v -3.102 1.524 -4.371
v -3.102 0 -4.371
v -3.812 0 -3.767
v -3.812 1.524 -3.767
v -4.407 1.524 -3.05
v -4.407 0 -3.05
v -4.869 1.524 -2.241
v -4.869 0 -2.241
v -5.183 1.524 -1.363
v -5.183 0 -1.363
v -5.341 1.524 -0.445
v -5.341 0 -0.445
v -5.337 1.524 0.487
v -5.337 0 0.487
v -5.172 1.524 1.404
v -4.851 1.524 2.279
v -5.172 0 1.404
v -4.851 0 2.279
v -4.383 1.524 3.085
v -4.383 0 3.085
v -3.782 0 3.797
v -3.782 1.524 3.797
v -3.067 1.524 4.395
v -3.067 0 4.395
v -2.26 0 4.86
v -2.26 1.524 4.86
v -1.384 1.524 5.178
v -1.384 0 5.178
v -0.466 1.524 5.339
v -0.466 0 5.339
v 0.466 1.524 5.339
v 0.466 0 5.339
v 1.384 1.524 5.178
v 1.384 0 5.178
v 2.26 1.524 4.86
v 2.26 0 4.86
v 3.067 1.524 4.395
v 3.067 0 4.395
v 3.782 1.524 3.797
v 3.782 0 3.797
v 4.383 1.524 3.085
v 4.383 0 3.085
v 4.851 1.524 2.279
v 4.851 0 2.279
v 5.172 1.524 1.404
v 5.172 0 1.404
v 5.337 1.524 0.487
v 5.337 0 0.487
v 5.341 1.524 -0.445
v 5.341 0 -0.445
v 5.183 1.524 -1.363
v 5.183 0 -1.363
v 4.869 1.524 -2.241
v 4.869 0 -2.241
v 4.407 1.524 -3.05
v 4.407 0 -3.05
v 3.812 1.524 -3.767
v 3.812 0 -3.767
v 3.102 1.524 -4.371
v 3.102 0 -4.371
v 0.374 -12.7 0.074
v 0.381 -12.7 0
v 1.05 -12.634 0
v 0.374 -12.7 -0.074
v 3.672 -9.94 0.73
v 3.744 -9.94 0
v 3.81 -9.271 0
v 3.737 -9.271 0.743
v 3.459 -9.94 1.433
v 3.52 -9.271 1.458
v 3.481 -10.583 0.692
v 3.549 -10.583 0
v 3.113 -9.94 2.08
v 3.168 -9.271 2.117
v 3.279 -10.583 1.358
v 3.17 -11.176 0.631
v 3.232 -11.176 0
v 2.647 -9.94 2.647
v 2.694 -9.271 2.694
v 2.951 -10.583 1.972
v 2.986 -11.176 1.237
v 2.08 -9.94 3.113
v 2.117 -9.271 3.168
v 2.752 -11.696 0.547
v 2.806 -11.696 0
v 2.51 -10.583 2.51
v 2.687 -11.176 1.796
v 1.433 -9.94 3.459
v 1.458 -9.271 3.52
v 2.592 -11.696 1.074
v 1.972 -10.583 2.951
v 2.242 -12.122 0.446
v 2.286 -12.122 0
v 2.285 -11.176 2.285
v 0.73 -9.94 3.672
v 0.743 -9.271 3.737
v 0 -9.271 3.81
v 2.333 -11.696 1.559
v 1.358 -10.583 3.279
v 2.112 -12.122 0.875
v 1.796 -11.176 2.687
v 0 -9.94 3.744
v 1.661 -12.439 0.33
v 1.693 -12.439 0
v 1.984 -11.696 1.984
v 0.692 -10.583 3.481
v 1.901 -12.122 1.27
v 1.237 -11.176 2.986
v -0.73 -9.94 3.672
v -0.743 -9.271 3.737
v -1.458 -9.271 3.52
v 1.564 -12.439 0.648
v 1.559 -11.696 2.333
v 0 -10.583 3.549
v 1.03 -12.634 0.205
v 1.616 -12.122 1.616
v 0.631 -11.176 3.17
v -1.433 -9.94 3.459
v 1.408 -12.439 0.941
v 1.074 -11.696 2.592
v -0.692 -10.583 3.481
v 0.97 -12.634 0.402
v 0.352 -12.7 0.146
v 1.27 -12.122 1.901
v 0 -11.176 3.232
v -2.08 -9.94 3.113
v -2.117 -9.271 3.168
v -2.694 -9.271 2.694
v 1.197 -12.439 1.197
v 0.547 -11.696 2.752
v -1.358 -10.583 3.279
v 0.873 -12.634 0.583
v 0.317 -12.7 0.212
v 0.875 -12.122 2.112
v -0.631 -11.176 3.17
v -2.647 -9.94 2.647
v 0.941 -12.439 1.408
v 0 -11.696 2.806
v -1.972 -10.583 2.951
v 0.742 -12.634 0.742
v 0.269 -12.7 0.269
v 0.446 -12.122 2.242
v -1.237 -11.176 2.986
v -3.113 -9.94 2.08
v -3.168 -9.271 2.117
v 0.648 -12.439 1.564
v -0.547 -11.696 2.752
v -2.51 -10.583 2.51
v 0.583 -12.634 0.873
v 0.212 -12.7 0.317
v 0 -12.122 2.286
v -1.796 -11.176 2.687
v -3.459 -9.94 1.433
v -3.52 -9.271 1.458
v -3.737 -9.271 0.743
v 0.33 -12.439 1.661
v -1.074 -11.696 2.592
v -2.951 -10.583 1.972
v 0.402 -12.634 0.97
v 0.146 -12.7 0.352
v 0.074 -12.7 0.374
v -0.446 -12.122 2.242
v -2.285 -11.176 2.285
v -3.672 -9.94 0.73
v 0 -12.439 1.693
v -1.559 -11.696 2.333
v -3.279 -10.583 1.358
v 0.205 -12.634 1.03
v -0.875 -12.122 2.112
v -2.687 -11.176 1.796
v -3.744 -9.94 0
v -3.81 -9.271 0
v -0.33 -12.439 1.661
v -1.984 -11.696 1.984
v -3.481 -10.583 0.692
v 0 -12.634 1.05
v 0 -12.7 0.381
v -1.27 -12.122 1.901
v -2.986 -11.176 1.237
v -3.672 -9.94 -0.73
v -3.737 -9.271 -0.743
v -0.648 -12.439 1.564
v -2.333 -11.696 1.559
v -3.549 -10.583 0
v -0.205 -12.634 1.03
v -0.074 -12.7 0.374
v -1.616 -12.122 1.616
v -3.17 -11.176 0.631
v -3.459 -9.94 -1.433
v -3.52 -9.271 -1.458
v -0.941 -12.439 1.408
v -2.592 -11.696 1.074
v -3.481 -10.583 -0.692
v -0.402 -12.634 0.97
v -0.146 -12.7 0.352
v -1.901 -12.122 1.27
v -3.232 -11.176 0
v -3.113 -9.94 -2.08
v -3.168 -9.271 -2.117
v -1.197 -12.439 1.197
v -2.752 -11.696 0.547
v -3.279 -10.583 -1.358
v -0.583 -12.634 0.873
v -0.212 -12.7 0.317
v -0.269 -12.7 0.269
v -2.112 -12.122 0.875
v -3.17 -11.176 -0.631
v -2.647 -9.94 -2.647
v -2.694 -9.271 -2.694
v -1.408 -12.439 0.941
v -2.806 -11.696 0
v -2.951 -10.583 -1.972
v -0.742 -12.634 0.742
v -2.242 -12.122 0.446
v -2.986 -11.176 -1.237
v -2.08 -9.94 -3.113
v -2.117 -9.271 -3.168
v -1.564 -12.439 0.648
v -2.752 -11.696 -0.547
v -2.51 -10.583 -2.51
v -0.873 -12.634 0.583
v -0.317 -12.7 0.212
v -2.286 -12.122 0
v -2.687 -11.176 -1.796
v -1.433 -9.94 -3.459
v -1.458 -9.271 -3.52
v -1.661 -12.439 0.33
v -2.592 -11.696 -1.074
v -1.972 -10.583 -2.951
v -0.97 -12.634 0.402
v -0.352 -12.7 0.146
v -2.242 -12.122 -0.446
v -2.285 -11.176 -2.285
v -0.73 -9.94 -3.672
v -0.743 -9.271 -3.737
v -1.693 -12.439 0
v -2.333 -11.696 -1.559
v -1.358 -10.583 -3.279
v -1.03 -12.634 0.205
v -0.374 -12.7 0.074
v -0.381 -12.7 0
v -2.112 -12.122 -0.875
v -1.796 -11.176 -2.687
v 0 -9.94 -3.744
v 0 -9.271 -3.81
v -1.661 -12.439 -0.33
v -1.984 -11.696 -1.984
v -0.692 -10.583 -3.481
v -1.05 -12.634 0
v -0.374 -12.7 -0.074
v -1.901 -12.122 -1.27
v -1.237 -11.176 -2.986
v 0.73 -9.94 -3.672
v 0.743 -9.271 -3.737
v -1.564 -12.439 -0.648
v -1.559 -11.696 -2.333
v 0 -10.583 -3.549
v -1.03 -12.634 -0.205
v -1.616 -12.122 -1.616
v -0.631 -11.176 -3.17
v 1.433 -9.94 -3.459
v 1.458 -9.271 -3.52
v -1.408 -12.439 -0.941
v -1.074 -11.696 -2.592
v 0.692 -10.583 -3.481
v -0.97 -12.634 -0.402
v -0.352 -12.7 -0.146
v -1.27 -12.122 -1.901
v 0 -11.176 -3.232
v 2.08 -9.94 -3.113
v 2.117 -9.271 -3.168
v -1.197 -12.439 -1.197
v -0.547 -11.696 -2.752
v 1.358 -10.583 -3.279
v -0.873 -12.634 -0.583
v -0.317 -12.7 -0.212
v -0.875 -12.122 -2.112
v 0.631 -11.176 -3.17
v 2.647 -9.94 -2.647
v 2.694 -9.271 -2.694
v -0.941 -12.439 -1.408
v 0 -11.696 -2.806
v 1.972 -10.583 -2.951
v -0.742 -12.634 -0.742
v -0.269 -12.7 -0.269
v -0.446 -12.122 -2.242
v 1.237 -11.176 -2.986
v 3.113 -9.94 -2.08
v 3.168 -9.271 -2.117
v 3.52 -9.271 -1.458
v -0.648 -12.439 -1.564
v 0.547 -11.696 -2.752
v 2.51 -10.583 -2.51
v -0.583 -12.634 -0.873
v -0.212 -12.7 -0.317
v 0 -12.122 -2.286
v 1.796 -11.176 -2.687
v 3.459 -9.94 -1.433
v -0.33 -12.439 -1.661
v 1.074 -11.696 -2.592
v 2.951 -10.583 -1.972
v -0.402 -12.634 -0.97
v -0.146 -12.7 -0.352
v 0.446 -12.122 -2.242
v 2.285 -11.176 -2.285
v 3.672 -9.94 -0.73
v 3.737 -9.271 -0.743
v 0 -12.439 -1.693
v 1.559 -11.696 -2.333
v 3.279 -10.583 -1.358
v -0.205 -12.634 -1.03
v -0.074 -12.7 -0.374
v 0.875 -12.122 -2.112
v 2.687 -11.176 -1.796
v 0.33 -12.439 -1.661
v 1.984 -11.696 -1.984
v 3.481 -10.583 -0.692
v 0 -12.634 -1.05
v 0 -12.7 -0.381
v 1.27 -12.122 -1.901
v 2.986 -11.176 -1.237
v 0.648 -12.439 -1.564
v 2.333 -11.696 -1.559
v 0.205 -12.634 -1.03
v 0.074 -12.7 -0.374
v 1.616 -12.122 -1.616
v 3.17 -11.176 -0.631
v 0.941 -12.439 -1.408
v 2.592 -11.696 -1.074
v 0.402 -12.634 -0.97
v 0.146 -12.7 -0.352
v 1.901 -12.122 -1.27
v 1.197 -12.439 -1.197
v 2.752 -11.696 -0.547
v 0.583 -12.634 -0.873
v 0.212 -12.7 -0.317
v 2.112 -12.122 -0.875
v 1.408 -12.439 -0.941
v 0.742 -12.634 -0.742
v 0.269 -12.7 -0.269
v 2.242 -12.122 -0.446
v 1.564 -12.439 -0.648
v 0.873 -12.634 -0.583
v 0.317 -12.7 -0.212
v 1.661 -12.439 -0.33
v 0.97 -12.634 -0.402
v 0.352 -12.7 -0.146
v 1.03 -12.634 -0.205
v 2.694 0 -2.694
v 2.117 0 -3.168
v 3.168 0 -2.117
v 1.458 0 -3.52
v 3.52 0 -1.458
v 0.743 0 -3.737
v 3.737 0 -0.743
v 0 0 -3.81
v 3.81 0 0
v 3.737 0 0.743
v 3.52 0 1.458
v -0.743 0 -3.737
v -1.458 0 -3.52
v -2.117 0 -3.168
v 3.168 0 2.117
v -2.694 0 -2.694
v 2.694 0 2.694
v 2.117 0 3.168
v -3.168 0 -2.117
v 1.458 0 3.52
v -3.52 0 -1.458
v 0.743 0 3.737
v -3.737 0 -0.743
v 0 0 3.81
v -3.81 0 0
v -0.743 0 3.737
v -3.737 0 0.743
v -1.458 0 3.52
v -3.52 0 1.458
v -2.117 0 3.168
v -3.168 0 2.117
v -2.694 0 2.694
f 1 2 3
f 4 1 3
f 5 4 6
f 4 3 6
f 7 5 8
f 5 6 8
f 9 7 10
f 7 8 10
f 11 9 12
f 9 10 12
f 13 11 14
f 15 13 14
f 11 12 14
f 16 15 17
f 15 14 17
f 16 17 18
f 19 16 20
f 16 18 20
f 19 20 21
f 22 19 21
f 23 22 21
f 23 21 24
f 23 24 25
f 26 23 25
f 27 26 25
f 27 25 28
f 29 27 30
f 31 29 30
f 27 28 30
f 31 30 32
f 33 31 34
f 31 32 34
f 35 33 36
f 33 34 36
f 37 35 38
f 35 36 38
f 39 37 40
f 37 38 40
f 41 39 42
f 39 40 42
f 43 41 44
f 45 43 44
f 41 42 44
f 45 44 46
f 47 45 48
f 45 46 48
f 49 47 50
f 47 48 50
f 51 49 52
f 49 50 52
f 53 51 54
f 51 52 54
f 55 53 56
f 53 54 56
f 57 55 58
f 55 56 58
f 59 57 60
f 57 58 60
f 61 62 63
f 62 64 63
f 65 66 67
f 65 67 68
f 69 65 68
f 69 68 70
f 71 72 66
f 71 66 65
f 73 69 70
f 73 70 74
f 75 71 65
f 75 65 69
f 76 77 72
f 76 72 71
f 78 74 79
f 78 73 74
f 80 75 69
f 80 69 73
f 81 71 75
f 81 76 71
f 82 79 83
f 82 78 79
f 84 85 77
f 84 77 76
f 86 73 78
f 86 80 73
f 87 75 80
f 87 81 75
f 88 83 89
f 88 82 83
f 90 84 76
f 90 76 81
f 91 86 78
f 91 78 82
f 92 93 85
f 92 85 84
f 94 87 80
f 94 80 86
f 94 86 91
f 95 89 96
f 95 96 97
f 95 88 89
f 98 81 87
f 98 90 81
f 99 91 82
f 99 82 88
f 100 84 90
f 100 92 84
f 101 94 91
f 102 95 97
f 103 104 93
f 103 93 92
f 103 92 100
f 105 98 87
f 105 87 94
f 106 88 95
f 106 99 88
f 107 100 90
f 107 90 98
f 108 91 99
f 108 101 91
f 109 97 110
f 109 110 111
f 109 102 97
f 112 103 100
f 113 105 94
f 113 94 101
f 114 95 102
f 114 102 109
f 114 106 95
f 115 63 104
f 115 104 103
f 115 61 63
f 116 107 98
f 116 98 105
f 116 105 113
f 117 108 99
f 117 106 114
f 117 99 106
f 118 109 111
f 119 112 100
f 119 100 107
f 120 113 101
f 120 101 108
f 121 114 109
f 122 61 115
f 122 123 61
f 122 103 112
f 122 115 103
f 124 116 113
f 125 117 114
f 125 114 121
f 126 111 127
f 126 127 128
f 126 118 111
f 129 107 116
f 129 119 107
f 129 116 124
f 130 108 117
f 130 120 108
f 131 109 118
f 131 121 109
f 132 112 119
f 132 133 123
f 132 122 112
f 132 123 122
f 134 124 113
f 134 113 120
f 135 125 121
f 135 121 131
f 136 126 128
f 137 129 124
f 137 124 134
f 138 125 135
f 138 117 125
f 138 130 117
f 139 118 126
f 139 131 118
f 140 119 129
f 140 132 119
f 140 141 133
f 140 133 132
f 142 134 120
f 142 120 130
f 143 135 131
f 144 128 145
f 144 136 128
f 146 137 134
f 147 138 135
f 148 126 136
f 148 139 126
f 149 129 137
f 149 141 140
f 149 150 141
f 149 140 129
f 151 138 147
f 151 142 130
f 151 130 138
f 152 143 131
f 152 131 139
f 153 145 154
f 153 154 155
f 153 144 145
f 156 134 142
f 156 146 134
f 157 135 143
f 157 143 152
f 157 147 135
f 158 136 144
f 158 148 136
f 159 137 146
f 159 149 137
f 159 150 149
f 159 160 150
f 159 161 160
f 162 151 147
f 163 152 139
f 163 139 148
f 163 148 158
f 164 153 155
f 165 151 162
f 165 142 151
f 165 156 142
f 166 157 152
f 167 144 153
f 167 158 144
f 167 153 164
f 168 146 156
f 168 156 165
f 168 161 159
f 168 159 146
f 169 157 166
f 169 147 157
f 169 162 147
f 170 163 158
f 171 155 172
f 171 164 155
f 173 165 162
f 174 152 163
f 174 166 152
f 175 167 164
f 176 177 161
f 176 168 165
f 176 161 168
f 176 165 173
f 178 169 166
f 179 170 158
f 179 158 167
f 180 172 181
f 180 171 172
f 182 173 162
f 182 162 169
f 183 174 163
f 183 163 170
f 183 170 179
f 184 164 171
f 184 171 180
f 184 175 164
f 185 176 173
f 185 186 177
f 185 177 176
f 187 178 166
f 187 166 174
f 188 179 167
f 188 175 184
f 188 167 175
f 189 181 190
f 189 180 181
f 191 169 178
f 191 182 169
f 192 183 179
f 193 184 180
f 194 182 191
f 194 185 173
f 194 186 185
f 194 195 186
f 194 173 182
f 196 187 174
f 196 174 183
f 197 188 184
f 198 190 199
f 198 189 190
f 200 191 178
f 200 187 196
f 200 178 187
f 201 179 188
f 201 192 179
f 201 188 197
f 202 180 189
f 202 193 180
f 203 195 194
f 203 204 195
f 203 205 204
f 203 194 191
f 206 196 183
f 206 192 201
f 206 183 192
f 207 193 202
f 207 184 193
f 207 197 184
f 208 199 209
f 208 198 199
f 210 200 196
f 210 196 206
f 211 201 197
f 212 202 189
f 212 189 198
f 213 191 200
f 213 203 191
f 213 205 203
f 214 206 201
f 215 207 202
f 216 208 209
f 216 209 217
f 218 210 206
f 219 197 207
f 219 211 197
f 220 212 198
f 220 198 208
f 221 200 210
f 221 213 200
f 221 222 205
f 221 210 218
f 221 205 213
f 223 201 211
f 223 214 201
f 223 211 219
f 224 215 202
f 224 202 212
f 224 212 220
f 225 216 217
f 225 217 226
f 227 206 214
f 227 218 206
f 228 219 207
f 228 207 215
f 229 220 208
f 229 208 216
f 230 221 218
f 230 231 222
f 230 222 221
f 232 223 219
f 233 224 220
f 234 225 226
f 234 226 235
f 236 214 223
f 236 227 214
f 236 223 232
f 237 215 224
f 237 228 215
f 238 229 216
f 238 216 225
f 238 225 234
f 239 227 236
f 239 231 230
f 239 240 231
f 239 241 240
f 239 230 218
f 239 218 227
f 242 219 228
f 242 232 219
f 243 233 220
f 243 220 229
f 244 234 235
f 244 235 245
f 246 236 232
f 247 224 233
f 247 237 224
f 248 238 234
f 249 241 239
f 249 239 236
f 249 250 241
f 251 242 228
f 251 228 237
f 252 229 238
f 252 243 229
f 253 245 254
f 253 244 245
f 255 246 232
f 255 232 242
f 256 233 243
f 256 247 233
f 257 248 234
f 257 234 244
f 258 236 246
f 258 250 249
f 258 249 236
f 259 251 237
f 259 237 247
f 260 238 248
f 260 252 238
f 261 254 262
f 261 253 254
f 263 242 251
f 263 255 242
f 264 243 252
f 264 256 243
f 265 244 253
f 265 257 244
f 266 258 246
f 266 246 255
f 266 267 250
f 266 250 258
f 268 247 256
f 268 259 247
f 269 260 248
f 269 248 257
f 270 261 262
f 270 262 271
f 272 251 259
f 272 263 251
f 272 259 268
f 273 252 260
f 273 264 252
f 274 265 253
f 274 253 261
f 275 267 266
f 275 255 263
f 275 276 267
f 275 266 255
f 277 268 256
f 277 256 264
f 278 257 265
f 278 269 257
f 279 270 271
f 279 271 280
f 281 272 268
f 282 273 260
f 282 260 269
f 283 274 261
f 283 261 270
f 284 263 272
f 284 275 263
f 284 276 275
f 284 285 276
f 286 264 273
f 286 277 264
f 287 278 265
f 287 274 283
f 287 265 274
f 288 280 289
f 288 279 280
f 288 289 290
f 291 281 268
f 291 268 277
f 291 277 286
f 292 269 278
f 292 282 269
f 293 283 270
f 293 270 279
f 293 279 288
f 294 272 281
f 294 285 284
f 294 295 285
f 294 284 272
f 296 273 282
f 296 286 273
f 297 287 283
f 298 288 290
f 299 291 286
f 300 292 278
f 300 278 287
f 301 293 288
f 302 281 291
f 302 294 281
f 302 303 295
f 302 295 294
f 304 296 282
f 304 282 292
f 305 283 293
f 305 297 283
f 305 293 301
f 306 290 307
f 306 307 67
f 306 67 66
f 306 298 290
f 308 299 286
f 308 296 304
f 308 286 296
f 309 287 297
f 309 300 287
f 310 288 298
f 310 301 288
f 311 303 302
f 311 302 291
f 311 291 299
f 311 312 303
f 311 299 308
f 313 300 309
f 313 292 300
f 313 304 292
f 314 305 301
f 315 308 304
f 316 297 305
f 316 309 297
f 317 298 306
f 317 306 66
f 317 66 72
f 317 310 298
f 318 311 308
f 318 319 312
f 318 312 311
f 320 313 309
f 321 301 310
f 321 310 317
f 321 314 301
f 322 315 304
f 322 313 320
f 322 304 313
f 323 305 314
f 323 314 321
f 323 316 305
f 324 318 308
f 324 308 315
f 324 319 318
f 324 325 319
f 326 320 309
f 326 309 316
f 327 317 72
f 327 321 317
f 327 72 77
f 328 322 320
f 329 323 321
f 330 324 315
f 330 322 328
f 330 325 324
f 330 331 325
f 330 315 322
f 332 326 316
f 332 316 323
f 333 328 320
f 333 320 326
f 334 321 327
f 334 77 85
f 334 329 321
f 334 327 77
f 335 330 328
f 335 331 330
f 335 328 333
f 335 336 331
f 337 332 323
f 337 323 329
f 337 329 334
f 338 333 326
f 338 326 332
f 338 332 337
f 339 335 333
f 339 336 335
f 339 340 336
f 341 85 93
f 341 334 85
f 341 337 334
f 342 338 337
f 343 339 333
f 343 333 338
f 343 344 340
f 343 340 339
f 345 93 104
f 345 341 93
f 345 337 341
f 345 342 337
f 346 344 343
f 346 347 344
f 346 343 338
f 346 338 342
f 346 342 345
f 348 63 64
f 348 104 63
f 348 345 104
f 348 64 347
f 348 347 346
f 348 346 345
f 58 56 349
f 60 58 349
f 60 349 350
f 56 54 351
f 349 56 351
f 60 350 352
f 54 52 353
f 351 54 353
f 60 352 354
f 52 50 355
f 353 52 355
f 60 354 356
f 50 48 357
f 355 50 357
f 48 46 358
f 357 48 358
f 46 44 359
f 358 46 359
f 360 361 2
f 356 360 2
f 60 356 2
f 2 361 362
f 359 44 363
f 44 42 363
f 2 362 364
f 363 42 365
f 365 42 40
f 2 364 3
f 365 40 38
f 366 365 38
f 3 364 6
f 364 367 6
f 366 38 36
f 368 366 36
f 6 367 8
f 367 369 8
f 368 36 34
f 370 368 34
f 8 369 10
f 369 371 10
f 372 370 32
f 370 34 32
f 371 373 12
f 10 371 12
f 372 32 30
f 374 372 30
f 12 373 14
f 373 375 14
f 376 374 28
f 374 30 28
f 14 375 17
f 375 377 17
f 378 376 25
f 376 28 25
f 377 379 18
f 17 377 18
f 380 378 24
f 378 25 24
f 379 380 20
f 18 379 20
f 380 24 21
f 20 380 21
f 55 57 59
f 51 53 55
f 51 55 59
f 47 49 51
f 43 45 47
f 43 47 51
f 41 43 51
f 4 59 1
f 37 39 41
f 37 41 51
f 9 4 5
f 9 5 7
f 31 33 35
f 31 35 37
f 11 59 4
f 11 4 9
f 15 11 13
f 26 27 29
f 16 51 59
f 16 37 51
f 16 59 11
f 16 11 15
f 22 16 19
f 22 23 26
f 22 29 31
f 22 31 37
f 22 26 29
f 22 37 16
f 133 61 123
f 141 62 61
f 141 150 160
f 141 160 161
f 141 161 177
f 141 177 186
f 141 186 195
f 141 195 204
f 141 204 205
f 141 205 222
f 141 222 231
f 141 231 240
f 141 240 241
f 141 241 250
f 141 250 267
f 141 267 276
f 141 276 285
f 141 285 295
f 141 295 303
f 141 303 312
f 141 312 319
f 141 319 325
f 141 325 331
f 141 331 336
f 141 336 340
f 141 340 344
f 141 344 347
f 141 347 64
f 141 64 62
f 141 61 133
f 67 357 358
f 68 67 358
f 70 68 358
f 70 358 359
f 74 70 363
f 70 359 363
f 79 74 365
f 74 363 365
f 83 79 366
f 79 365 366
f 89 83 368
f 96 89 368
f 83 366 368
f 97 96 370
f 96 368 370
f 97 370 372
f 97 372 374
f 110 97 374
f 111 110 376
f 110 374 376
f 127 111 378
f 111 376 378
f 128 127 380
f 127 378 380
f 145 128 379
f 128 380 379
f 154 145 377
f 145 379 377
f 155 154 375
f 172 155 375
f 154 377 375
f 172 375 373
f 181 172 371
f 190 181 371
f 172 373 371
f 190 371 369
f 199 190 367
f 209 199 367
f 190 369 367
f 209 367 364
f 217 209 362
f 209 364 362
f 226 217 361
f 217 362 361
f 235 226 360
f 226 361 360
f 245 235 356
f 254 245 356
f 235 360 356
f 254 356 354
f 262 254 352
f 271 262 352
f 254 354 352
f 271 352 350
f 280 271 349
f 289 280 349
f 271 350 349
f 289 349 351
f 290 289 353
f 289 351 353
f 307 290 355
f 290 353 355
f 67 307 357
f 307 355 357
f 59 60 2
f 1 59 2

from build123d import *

# Parameters (mm, degrees)
F0_R     = 3.81
F1_DEPTH = 12.7
F2_R     = 3.429
F4_DEPTH = 1.524


with BuildPart() as f1:
    # F0 (on Front) → F1 (new body)
    with BuildSketch(Plane.XZ):
        Circle(F0_R)
    extrude(amount=F1_DEPTH)

    # F2
    f2_edges = [f1.edges().sort_by_distance(p)[0] for p in [
        (-3.81, -12.7, 0),
    ]]
    fillet(f2_edges, radius=F2_R)

    # F3 (on face) → F4 (join)
    with BuildSketch(Plane(origin=(0, 0, 0), x_dir=(-1, 0, 0), z_dir=(0, 1, 0))):
        with BuildLine():
            Line((-3.101973, -4.370782), (3.101973, -4.370782))
            ThreePointArc((3.101973, -4.370782), (0, 5.359661), (-3.101973, -4.370782))
        make_face()
    extrude(amount=F4_DEPTH)


solid = f1.part
